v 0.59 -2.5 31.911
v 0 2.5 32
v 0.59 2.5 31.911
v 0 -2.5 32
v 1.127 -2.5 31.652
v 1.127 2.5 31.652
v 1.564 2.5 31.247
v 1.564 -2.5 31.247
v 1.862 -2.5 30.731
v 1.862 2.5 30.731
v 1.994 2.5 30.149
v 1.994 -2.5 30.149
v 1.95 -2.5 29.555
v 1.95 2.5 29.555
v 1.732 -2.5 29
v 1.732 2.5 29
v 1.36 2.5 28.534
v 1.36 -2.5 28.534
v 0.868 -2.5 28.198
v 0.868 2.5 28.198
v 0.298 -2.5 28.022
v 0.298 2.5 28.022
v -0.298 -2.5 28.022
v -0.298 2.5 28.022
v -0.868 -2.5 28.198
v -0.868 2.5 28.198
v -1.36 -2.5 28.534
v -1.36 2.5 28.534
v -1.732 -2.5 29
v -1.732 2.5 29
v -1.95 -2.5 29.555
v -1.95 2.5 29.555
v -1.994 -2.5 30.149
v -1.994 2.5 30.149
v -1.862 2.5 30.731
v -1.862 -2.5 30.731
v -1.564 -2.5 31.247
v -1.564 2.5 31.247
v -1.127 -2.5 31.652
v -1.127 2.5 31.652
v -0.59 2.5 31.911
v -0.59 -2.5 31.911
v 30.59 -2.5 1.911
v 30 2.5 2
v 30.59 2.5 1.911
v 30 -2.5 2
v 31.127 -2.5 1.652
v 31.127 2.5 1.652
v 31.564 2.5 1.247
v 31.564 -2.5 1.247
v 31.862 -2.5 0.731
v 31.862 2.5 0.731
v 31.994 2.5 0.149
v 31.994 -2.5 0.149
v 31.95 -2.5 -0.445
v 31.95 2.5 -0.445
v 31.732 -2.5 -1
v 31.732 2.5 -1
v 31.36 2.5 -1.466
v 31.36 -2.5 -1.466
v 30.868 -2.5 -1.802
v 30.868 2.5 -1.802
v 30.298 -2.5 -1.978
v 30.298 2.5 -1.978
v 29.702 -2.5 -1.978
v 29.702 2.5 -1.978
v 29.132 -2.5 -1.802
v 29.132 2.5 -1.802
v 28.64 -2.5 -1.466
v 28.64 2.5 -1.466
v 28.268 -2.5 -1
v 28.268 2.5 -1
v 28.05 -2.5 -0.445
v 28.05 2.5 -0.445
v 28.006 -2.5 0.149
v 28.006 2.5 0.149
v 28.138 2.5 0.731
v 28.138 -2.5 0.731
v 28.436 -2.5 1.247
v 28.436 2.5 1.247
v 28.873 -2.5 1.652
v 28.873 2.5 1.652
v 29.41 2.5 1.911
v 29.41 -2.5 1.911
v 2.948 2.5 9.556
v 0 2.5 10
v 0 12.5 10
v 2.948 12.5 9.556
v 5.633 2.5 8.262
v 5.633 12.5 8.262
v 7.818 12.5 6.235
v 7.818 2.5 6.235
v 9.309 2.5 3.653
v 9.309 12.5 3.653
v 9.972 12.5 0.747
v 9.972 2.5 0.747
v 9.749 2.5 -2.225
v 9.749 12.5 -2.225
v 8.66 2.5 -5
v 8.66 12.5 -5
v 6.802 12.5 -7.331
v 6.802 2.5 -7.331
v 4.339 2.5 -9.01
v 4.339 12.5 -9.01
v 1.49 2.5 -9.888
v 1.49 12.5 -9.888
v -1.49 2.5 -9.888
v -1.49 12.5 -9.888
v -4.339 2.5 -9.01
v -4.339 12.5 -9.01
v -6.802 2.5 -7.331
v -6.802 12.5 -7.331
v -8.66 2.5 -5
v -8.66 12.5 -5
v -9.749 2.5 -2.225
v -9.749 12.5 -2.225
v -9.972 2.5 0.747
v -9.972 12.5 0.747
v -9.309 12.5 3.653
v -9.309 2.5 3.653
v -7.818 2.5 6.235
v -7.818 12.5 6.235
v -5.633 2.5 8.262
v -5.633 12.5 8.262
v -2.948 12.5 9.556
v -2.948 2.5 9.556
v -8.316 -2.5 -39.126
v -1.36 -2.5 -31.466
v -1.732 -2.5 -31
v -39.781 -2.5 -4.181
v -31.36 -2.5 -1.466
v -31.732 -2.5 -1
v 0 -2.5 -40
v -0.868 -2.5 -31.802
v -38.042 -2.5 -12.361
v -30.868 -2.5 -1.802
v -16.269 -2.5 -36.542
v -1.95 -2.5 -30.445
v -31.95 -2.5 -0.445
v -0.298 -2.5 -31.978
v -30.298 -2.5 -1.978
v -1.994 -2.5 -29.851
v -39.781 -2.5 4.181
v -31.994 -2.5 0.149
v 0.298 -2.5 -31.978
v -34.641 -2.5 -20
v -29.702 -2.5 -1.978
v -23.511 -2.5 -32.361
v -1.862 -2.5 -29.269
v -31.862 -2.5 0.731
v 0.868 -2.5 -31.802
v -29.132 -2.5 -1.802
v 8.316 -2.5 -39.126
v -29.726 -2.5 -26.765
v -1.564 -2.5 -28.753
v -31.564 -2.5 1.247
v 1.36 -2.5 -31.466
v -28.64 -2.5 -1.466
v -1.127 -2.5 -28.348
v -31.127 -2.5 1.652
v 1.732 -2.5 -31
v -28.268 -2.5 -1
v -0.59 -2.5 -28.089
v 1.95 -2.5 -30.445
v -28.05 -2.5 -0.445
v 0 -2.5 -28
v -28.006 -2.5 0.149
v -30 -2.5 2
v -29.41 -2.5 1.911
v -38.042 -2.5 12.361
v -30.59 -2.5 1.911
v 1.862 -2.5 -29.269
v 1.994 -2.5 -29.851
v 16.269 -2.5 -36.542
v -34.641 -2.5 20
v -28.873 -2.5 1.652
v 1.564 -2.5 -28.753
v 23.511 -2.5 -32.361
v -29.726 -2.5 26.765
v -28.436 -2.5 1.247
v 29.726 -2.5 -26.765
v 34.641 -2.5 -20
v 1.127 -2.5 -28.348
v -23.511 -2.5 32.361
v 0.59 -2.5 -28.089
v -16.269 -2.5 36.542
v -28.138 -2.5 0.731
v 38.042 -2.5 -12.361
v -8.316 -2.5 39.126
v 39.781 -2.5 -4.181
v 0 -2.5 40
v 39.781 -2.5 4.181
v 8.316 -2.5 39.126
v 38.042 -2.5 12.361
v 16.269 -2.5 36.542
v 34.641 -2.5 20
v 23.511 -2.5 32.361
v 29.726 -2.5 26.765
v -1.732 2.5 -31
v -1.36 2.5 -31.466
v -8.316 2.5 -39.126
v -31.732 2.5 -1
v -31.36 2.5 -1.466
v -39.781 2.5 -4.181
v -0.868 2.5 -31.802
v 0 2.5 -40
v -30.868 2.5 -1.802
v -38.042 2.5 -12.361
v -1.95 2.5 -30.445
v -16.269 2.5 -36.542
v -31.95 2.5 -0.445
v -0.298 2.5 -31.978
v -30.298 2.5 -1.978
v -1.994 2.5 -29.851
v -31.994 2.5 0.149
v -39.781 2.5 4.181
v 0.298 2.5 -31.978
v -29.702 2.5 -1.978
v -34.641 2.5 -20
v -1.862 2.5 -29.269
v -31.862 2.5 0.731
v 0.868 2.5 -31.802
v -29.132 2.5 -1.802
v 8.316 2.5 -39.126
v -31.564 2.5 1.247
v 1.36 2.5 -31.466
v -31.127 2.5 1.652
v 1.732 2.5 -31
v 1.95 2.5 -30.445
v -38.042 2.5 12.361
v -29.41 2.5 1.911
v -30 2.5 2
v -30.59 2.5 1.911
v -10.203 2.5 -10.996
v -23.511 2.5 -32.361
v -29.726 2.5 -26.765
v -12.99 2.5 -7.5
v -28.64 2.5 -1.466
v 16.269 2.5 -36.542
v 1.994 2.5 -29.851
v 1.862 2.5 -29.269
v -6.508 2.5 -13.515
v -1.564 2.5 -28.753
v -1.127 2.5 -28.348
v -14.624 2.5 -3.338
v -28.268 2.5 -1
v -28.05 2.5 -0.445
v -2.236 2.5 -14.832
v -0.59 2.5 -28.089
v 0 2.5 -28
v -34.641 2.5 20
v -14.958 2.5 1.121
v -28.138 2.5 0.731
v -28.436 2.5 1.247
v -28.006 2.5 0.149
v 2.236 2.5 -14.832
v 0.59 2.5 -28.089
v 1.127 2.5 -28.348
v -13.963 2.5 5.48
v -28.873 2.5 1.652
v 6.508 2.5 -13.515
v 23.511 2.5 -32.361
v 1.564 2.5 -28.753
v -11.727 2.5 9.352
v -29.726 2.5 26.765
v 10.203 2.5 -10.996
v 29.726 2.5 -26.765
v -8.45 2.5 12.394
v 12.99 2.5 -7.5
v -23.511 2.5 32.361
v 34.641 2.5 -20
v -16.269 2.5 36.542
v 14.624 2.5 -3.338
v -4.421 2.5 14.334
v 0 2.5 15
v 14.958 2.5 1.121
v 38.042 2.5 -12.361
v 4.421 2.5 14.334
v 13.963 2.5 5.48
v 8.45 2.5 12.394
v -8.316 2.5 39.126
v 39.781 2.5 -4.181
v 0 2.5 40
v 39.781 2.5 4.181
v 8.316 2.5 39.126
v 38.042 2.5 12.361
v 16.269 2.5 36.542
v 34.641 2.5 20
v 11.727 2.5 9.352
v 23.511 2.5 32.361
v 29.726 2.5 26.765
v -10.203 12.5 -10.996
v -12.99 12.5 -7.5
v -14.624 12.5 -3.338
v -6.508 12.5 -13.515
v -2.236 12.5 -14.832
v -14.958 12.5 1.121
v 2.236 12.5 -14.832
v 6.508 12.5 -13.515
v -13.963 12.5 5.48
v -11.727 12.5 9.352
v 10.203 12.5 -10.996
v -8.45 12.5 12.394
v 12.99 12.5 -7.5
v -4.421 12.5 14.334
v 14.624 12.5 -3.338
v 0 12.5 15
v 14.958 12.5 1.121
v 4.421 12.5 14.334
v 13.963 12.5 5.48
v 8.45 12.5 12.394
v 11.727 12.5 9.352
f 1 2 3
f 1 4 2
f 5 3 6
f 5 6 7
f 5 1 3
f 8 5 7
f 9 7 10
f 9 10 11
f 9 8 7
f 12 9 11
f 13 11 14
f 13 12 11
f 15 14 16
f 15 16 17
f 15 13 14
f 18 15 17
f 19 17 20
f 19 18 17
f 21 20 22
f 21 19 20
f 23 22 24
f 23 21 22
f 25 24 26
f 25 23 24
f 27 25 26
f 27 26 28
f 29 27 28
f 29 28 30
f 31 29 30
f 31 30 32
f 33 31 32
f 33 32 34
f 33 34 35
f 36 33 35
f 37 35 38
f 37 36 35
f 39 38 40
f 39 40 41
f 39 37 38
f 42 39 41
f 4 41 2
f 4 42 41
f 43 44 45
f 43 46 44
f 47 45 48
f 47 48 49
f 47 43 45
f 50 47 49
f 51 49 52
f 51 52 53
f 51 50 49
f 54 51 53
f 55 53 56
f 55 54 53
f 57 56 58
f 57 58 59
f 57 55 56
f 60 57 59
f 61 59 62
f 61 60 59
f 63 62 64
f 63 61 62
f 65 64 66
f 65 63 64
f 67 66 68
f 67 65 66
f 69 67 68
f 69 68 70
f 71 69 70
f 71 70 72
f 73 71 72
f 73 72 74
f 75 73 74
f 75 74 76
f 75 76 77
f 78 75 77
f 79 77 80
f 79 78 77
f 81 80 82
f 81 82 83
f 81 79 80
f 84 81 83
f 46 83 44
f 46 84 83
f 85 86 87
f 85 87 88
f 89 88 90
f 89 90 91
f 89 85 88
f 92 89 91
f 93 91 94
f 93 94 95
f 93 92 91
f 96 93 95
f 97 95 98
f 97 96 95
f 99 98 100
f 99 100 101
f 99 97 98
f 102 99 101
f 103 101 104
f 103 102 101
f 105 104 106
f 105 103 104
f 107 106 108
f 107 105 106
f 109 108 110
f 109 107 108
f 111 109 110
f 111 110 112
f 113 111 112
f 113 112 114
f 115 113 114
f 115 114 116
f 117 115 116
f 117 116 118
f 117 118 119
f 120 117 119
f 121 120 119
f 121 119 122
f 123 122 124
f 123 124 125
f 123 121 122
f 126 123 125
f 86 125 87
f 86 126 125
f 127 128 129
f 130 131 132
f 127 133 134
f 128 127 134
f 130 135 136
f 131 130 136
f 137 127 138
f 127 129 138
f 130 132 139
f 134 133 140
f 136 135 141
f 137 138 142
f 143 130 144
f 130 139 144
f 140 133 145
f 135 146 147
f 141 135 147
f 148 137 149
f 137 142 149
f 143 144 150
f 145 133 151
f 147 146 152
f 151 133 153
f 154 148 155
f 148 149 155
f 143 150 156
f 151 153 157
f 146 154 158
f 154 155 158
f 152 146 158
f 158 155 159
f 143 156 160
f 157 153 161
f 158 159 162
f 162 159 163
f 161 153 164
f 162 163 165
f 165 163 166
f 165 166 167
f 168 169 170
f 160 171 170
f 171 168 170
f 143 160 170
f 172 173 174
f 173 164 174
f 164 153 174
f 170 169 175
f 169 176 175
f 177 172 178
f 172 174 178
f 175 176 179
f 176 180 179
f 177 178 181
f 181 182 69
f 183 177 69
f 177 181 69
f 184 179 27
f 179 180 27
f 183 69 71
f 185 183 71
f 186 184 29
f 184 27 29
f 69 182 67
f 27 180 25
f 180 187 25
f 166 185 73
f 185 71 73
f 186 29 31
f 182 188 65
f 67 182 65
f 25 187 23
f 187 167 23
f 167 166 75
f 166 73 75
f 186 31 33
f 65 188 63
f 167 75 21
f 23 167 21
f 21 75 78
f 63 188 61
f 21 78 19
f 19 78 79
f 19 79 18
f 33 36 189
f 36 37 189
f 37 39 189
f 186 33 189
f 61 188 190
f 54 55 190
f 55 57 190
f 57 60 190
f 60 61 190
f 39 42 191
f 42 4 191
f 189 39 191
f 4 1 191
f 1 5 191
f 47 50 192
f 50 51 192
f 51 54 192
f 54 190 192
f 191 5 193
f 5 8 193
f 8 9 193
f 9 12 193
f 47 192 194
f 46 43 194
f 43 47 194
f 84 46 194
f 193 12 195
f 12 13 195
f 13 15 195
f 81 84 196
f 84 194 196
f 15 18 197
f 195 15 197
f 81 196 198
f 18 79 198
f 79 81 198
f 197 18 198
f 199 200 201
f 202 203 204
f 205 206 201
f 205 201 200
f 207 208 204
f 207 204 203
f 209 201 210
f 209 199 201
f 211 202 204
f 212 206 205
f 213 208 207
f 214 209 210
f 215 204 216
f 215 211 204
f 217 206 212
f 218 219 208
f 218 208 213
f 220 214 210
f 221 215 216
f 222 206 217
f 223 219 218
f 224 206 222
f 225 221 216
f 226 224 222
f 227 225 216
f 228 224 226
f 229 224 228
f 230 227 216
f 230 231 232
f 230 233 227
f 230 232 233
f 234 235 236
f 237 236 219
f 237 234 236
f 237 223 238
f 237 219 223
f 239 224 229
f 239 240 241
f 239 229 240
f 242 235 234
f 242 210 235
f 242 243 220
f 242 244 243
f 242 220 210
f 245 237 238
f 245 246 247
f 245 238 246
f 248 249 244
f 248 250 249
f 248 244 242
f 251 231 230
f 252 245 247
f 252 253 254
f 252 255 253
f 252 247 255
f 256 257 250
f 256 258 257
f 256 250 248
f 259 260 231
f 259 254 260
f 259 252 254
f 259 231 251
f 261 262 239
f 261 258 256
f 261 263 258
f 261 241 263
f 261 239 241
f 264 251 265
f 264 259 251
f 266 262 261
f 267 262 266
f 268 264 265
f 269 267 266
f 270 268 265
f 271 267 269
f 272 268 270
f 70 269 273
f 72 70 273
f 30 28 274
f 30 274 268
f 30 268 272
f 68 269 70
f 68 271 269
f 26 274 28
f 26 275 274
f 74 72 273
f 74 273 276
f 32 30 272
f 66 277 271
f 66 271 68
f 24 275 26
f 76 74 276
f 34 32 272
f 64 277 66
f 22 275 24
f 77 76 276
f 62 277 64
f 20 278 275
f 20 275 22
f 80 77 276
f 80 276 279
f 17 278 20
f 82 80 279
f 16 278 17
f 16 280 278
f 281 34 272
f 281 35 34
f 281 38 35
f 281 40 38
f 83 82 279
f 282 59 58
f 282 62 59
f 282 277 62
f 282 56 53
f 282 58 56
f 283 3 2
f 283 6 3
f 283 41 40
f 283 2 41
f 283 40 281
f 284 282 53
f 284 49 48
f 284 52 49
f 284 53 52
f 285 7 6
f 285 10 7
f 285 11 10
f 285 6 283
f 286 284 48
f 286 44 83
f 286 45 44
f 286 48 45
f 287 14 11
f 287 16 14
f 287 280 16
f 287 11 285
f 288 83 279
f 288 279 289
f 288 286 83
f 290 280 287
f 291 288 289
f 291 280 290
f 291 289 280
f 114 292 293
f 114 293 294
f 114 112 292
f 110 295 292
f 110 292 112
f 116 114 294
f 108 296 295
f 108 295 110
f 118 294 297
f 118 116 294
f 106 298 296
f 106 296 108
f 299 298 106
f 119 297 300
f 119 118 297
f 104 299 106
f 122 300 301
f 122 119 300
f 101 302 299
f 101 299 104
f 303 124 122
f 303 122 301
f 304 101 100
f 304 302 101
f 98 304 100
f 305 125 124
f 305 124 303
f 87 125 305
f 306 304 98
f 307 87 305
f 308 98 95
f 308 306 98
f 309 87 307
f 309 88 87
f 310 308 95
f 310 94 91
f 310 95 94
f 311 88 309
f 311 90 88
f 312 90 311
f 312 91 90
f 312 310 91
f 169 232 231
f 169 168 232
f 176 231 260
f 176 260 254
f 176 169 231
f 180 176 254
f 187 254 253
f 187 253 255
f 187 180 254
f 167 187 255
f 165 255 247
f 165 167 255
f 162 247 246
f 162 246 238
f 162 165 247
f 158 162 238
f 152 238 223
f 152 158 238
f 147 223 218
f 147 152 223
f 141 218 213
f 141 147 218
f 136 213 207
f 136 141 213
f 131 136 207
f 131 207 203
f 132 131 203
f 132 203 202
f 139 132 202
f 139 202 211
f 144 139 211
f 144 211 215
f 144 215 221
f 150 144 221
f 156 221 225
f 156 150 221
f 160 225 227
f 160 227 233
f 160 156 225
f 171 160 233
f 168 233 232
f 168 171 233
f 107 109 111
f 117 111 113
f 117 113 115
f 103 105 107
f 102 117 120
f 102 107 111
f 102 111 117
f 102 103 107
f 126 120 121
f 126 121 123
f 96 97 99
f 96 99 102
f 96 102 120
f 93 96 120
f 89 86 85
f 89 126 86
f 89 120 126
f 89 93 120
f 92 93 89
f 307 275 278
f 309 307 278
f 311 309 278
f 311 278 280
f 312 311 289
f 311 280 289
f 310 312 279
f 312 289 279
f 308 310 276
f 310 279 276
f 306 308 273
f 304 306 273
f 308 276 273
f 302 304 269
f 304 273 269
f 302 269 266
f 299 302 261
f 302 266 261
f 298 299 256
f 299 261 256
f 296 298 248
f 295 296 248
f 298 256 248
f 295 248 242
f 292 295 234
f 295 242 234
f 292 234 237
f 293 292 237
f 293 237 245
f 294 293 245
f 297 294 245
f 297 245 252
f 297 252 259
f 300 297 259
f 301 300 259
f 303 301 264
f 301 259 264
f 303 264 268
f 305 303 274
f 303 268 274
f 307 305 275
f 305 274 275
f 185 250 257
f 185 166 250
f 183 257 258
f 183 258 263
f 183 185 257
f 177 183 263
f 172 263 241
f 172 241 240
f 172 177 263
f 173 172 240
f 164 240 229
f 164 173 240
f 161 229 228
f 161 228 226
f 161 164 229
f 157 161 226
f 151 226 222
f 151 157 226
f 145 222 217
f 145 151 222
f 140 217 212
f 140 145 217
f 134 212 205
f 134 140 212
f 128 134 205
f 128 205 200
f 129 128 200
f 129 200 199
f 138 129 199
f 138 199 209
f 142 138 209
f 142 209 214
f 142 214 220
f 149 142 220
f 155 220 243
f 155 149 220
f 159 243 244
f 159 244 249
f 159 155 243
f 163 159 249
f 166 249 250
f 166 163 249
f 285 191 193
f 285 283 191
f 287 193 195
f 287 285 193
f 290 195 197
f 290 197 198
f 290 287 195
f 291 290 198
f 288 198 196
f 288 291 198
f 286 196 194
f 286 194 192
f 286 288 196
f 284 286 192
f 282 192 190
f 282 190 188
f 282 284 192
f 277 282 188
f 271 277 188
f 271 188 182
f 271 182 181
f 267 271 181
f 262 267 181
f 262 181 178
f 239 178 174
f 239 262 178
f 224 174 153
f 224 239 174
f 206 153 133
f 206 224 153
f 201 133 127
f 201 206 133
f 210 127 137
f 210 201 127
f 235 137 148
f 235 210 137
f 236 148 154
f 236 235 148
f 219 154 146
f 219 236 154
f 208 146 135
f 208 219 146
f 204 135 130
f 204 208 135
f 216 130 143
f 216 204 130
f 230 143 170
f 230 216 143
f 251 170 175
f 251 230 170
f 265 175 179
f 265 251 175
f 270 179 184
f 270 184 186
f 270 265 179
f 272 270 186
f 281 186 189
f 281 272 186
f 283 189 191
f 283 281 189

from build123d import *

# Parameters (mm, degrees)
SKETCH1_R           = 40
SKETCH1_R_2         = 2
BOSS_EXTRUDE1_DEPTH = 2.5
SKETCH2_R           = 15
SKETCH2_R_2         = 10
BOSS_EXTRUDE2_DEPTH = 10


with BuildPart() as part:
    # Sketch1 → Boss-Extrude1 (new, symmetric)
    with BuildSketch(Plane(origin=(0, 0, 0), x_dir=(1, 0, 0), z_dir=(0, 1, 0))):
        with Locations(Location((0, 0, 0), (0, 0, 270))):
            Circle(SKETCH1_R)
        with Locations(Location((0, 30, 0), (0, 0, 270))):
            Circle(SKETCH1_R_2, mode=Mode.SUBTRACT)
        with Locations(Location((30, 0, 0), (0, 0, 270))):
            Circle(SKETCH1_R_2, mode=Mode.SUBTRACT)
        with Locations(Location((0, -30, 0), (0, 0, 270))):
            Circle(SKETCH1_R_2, mode=Mode.SUBTRACT)
        with Locations(Location((-30, 0, 0), (0, 0, 270))):
            Circle(SKETCH1_R_2, mode=Mode.SUBTRACT)
    extrude(amount=BOSS_EXTRUDE1_DEPTH, both=True)

    # Sketch2 → Boss-Extrude2 (add)
    with BuildSketch(Plane(origin=(0, 2.5, 0), x_dir=(1, 0, 0), z_dir=(0, 1, 0))):
        with Locations(Location((0, 0, 0), (0, 0, 270))):
            Circle(SKETCH2_R)
        with Locations(Location((0, 0, 0), (0, 0, 270))):
            Circle(SKETCH2_R_2, mode=Mode.SUBTRACT)
    extrude(amount=BOSS_EXTRUDE2_DEPTH)


solid = part.part
